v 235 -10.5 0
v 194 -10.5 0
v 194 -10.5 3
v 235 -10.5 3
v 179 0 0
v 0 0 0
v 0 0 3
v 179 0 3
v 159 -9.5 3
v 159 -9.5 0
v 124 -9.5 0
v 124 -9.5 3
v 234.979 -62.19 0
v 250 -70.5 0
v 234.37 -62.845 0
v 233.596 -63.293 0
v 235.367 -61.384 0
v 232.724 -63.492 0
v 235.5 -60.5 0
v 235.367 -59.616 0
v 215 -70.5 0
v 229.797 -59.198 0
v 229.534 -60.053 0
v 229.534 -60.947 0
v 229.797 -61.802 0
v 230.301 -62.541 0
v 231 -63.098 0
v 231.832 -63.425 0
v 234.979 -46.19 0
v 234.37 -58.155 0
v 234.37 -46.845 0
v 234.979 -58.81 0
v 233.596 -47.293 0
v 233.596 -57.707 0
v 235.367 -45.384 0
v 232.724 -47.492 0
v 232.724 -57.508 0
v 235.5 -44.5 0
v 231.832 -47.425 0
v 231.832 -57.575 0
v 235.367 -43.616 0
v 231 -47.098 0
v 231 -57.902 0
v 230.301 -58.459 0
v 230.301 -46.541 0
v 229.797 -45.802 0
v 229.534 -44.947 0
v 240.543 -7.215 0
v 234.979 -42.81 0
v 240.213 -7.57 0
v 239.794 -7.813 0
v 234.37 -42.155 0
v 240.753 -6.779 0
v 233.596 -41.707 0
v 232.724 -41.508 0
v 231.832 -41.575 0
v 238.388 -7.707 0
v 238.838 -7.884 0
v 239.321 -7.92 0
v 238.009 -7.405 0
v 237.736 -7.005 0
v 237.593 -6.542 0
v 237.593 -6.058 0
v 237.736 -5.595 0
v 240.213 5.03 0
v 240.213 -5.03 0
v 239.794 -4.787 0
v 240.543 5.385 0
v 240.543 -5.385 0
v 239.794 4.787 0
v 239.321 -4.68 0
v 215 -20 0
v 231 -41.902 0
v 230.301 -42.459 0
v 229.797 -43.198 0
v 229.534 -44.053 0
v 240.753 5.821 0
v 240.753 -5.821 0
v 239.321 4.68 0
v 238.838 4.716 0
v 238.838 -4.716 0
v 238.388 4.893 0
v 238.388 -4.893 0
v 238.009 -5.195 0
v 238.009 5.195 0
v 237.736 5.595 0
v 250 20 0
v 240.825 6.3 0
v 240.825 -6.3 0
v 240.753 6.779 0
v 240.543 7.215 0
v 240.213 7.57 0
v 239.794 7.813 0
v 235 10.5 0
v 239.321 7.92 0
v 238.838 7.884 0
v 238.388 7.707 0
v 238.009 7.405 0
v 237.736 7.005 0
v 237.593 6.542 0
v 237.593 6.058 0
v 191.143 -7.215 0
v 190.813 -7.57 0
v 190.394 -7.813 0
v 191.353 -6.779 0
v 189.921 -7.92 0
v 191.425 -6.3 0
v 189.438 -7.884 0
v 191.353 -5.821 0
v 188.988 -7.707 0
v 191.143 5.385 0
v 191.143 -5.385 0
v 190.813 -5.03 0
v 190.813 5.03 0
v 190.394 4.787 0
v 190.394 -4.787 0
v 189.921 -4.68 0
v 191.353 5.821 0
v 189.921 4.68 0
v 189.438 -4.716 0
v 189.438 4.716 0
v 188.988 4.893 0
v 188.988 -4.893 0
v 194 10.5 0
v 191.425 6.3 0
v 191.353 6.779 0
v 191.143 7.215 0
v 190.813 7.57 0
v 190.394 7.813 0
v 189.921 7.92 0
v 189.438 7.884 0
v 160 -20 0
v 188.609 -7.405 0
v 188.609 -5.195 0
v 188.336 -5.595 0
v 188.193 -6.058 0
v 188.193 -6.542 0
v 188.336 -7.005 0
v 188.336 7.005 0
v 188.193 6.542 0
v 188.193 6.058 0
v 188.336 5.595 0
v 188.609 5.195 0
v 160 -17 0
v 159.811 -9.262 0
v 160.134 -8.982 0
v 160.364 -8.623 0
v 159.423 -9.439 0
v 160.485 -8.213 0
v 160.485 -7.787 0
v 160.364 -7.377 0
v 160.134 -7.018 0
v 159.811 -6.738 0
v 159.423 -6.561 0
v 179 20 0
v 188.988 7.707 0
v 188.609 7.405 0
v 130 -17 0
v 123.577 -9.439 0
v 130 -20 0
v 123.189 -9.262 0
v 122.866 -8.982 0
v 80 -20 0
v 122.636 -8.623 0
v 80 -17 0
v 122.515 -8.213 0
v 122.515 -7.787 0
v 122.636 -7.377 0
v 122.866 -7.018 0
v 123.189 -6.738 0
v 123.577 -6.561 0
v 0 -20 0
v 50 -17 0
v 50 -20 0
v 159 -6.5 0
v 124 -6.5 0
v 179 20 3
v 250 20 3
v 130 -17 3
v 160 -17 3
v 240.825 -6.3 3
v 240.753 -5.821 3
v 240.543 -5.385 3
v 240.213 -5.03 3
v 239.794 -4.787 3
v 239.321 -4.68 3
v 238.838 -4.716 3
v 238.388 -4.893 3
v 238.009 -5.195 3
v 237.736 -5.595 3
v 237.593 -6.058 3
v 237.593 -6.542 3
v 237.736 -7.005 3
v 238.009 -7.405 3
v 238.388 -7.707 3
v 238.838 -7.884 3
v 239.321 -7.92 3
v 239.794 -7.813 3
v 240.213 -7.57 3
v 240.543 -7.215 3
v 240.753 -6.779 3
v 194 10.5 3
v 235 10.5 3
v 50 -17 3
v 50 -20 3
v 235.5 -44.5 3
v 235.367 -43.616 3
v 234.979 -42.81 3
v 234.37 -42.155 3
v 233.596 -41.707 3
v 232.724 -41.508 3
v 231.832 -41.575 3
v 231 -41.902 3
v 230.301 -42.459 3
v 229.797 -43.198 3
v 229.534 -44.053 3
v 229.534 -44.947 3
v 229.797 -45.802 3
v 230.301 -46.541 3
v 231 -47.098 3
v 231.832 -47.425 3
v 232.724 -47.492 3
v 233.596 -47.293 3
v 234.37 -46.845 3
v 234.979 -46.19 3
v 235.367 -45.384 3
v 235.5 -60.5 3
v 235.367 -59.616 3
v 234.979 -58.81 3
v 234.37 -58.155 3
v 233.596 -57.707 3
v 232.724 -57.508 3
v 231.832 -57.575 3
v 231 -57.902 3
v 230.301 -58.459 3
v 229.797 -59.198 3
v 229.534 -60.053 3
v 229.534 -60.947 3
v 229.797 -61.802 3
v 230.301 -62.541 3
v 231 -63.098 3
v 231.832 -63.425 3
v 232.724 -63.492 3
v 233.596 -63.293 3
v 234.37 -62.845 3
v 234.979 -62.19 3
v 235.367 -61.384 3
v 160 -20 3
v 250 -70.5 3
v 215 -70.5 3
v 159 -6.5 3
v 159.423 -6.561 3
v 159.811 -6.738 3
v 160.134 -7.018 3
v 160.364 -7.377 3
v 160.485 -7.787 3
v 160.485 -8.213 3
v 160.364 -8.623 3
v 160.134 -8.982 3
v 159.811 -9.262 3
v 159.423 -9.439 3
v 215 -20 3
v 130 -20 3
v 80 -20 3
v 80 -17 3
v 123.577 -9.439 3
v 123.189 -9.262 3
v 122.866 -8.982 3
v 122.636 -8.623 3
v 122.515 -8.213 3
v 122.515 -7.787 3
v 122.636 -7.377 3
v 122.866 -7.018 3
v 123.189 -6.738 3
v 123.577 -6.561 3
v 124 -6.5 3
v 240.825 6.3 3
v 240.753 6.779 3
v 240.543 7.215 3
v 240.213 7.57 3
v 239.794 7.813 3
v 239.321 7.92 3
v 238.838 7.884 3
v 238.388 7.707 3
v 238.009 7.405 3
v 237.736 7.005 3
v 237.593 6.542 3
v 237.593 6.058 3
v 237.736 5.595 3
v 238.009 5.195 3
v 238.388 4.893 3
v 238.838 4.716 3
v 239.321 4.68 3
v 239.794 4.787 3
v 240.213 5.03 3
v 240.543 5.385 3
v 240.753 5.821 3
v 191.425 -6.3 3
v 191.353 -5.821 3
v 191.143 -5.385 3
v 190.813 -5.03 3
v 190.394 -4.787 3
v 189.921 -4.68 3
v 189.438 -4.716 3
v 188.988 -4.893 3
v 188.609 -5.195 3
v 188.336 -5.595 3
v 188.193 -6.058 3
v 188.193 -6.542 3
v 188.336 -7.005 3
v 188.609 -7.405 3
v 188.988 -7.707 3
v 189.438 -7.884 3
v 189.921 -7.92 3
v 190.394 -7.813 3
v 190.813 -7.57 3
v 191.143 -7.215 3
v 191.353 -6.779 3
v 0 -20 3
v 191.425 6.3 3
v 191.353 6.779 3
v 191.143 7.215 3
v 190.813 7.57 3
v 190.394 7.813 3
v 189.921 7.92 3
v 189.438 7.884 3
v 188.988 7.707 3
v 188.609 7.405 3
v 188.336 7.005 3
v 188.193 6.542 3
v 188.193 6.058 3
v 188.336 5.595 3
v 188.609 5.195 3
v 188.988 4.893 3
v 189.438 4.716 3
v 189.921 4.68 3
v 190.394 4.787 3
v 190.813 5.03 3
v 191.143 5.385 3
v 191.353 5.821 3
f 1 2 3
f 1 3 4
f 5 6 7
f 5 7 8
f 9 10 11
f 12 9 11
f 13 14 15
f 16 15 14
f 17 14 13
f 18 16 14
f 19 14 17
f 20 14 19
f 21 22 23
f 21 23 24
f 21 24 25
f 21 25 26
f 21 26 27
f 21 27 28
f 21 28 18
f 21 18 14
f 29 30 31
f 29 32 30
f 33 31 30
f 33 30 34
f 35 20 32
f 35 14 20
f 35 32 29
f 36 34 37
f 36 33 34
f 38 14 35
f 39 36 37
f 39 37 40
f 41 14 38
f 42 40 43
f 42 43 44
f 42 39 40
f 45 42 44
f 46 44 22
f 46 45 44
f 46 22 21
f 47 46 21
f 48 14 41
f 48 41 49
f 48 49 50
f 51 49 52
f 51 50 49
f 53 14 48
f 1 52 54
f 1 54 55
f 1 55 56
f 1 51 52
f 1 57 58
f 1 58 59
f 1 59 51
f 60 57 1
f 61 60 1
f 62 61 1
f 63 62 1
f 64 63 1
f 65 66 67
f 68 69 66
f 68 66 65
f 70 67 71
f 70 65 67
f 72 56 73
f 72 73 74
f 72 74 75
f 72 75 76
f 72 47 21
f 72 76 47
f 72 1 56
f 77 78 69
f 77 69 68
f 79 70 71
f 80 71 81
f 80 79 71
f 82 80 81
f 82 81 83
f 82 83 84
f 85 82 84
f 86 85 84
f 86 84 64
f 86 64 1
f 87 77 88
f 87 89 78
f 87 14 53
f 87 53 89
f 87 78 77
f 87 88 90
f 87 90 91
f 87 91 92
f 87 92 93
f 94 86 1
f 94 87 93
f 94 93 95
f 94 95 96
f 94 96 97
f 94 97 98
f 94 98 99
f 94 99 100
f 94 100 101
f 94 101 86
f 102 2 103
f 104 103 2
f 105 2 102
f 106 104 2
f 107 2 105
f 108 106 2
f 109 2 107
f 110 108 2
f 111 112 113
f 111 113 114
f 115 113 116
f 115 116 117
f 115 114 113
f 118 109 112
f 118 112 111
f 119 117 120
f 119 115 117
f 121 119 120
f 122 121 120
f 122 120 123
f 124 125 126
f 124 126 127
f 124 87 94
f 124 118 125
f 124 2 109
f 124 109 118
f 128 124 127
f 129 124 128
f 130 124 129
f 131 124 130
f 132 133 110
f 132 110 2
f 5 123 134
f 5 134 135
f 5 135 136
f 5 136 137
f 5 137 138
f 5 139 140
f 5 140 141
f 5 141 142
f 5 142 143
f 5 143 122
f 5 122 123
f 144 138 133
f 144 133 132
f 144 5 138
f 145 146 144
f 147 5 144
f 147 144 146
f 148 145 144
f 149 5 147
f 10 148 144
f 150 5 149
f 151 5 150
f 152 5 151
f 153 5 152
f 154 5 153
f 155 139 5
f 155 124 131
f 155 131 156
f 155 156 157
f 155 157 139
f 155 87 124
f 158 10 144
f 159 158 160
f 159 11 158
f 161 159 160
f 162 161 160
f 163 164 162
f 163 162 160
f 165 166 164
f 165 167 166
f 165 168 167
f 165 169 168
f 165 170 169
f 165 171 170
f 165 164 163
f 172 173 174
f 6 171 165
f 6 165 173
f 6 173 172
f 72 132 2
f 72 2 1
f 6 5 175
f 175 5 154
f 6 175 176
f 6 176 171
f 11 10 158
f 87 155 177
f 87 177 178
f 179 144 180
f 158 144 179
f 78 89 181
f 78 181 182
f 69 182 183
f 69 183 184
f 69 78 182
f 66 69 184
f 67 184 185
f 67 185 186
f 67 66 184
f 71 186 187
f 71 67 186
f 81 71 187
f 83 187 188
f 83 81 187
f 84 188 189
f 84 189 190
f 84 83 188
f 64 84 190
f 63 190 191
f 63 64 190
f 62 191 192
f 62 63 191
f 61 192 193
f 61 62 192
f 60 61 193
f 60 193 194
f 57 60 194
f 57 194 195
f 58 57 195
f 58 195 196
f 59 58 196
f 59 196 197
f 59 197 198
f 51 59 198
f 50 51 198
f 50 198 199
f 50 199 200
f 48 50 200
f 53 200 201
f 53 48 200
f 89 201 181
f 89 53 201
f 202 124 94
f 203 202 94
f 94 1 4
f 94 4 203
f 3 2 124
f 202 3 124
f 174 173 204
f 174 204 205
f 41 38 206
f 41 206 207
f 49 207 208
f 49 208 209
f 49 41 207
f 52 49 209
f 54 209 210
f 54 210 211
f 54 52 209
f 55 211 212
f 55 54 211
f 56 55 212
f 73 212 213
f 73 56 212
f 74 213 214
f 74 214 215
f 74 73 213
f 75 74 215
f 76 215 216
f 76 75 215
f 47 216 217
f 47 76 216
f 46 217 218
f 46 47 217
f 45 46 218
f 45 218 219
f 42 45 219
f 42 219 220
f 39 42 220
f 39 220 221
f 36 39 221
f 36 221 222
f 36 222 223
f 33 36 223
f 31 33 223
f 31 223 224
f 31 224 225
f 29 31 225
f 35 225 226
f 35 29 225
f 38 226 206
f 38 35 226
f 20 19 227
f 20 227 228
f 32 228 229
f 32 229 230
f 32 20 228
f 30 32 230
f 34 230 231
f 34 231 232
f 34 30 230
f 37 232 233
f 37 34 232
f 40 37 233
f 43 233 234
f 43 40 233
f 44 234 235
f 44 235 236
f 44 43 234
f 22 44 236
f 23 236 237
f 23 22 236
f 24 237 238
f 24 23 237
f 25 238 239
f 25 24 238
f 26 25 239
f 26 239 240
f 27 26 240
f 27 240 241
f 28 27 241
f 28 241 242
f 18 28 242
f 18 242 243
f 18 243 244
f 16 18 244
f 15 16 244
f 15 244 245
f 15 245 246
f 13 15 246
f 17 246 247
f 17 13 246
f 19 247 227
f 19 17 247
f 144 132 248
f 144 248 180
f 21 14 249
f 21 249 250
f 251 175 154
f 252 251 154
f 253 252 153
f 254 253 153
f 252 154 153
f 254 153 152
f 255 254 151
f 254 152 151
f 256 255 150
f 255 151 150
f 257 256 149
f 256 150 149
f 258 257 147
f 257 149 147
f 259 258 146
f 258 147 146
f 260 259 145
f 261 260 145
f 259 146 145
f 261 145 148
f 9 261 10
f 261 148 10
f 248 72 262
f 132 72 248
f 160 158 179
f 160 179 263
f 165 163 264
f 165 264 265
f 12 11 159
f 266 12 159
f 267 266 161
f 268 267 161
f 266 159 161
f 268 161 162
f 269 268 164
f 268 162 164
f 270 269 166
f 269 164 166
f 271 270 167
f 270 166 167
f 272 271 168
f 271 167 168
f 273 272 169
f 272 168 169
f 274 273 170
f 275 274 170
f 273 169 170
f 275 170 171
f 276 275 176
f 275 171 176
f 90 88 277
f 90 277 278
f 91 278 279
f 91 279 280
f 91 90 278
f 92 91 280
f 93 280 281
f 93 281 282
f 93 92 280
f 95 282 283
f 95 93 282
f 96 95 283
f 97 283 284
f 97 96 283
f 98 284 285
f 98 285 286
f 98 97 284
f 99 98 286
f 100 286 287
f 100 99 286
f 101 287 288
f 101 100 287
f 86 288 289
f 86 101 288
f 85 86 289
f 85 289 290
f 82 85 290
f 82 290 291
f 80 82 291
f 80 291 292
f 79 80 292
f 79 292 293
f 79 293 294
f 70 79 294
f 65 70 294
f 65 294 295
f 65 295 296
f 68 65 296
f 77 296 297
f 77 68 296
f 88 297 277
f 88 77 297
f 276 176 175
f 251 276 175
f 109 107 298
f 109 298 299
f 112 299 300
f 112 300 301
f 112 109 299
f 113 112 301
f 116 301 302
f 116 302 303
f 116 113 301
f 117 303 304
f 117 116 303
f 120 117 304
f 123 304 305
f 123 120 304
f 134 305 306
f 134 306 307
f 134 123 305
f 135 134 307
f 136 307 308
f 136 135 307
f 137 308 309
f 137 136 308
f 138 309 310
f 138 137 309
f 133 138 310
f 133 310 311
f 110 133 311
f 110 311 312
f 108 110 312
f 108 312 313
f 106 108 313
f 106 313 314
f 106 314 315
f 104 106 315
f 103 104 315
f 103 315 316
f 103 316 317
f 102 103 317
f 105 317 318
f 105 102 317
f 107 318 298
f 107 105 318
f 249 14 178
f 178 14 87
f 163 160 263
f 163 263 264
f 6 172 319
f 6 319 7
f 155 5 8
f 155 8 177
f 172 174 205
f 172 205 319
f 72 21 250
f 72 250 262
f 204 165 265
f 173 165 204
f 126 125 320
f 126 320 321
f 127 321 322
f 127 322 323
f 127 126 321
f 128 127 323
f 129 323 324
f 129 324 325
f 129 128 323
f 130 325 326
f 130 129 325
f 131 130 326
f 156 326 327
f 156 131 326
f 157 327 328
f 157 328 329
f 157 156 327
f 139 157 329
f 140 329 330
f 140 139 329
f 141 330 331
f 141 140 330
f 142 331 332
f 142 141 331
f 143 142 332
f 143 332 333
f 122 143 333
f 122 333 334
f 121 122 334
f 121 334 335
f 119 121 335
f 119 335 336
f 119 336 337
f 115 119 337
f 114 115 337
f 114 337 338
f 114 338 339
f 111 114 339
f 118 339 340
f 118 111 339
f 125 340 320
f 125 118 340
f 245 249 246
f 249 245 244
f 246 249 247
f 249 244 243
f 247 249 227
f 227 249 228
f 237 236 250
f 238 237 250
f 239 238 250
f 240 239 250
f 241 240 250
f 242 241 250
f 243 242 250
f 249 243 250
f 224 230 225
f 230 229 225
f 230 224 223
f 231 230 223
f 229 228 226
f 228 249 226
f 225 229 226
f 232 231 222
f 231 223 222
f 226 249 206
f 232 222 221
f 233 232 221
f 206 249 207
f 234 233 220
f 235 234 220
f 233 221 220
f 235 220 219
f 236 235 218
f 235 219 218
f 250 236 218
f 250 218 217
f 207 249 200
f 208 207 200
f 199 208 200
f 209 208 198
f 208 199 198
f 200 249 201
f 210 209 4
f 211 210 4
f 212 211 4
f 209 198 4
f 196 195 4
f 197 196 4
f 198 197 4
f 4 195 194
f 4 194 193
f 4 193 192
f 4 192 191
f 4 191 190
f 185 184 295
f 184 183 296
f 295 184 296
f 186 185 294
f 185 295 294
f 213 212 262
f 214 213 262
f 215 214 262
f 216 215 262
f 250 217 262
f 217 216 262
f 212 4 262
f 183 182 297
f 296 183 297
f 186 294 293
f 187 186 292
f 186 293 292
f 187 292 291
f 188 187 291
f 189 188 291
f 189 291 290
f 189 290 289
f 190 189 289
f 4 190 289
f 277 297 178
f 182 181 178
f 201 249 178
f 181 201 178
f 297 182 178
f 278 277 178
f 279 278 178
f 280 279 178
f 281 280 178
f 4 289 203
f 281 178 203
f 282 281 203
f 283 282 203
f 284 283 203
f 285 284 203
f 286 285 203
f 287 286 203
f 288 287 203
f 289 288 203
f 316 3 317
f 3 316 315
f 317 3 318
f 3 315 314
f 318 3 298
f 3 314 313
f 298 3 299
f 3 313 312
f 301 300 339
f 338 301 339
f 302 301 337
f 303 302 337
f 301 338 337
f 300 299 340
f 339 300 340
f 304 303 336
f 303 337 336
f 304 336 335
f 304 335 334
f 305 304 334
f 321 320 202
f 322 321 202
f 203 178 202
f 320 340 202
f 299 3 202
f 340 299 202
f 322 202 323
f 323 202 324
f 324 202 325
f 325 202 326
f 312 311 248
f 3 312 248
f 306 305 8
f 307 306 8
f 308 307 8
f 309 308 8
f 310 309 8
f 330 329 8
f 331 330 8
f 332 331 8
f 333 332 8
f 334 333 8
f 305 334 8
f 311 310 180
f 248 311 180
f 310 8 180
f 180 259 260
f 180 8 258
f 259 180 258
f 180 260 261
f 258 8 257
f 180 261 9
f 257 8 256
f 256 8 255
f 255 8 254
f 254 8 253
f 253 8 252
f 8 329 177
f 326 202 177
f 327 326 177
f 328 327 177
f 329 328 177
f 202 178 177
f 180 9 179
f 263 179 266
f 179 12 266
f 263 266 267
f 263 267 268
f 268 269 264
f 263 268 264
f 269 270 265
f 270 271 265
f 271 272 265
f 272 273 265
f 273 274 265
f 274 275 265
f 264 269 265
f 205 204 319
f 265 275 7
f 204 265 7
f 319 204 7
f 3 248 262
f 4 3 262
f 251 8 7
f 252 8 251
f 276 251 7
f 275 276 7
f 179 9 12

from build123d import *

# Parameters (mm, degrees)
ESBO_O1_R                = 1.625
ESBO_O1_R_2              = 3
ESBO_O1_W                = 41
ESBO_O1_H                = 21
RESSALTO_EXTRUS_O1_DEPTH = 3


with BuildPart() as part:
    # Esboço1 → Ressalto-extrusão1 (new body)
    with BuildSketch(Plane.XY):
        Polygon((215, -20), (160, -20), (160, -17), (130, -17), (130, -20), (80, -20), (80, -17), (50, -17), (50, -20), (0, -20), (0, 0), (179, 0), (179, 20), (250, 20), (250, -20), (250, -70.5), (215, -70.5), align=None)
        with Locations((189.8, 6.3)):
            Circle(ESBO_O1_R, mode=Mode.SUBTRACT)
        with Locations((239.2, 6.3)):
            Circle(ESBO_O1_R, mode=Mode.SUBTRACT)
        with Locations((239.2, -6.3)):
            Circle(ESBO_O1_R, mode=Mode.SUBTRACT)
        with Locations((189.8, -6.3)):
            Circle(ESBO_O1_R, mode=Mode.SUBTRACT)
        with Locations((232.5, -60.5)):
            Circle(ESBO_O1_R_2, mode=Mode.SUBTRACT)
        with Locations((232.5, -44.5)):
            Circle(ESBO_O1_R_2, mode=Mode.SUBTRACT)
        with Locations((214.5, 0)):
            Rectangle(ESBO_O1_W, ESBO_O1_H, mode=Mode.SUBTRACT)
        with BuildLine():
            Line((124, -6.5), (159, -6.5))
            ThreePointArc((159, -6.5), (160.5, -8), (159, -9.5))
            Line((159, -9.5), (124, -9.5))
            ThreePointArc((124, -9.5), (122.5, -8), (124, -6.5))
        make_face(mode=Mode.SUBTRACT)
    extrude(amount=RESSALTO_EXTRUS_O1_DEPTH)


solid = part.part
